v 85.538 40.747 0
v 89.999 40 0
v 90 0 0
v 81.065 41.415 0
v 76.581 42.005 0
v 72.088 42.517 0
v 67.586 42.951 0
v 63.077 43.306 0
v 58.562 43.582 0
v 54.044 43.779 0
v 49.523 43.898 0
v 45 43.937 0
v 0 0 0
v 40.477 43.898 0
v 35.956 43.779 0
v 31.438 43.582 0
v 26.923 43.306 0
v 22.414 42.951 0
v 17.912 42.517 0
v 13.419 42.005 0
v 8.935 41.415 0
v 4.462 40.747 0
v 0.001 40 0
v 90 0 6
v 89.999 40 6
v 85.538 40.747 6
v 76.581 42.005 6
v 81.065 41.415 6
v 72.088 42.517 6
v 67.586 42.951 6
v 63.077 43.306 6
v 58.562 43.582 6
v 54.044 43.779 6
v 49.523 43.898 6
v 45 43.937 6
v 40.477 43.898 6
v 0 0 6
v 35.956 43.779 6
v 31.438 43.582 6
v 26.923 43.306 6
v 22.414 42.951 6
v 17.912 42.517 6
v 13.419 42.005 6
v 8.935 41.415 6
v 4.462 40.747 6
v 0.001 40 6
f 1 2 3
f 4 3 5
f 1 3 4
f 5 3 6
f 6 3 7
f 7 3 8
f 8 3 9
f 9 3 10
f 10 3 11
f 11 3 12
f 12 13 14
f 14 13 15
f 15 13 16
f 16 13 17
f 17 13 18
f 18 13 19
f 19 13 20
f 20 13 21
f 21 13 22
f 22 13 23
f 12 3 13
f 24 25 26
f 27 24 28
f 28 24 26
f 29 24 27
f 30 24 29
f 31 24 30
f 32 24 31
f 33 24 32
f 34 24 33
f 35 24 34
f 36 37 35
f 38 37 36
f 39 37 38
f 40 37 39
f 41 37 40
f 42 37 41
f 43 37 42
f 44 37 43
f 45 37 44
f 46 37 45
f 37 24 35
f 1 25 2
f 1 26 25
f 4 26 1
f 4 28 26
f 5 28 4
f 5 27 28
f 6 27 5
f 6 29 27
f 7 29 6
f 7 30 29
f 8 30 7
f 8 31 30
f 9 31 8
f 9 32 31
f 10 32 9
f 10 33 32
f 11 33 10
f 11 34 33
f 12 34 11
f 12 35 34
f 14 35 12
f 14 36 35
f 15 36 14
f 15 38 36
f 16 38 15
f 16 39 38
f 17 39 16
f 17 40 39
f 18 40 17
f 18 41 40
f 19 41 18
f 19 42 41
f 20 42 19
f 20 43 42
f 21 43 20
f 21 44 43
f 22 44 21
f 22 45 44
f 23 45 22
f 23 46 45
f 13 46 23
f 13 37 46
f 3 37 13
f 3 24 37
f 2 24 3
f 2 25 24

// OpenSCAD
$fn = 32;

// ----------------------------------------------------------------------
// Arc profile plate: crown, 23 points
// ----------------------------------------------------------------------

// --- parameters (mm) ---
bar_l = 90;               // bar length, X
bar_w = 40;               // bar height at the ends, Y
arc_r = 259.14;           // radius of the crown arc
arc_angle = 20;           // crown arc angle, degrees
crown_rise = 3.94;        // rise of the crown over the ends
arc_step = 1;             // sampling step of the crown arc, degrees
plate_t = 6;              // plate thickness, Z

bbox_y = bar_w + crown_rise;  // full height with the crown

profile = [[89.999, 40], [85.538, 40.747], [81.065, 41.415], [76.581, 42.005], [72.088, 42.517], [67.586, 42.951], [63.077, 43.306], [58.562, 43.582], [54.044, 43.779], [49.523, 43.898], [45, 43.937], [40.477, 43.898], [35.956, 43.779], [31.438, 43.582], [26.923, 43.306], [22.414, 42.951], [17.912, 42.517], [13.419, 42.005], [8.935, 41.415], [4.462, 40.747], [0.001, 40], [0, 0], [90, 0]];  // primary outline, 23 points, counter clockwise

// --- the one profile operation ---
linear_extrude(height = plate_t) polygon(points = profile);
